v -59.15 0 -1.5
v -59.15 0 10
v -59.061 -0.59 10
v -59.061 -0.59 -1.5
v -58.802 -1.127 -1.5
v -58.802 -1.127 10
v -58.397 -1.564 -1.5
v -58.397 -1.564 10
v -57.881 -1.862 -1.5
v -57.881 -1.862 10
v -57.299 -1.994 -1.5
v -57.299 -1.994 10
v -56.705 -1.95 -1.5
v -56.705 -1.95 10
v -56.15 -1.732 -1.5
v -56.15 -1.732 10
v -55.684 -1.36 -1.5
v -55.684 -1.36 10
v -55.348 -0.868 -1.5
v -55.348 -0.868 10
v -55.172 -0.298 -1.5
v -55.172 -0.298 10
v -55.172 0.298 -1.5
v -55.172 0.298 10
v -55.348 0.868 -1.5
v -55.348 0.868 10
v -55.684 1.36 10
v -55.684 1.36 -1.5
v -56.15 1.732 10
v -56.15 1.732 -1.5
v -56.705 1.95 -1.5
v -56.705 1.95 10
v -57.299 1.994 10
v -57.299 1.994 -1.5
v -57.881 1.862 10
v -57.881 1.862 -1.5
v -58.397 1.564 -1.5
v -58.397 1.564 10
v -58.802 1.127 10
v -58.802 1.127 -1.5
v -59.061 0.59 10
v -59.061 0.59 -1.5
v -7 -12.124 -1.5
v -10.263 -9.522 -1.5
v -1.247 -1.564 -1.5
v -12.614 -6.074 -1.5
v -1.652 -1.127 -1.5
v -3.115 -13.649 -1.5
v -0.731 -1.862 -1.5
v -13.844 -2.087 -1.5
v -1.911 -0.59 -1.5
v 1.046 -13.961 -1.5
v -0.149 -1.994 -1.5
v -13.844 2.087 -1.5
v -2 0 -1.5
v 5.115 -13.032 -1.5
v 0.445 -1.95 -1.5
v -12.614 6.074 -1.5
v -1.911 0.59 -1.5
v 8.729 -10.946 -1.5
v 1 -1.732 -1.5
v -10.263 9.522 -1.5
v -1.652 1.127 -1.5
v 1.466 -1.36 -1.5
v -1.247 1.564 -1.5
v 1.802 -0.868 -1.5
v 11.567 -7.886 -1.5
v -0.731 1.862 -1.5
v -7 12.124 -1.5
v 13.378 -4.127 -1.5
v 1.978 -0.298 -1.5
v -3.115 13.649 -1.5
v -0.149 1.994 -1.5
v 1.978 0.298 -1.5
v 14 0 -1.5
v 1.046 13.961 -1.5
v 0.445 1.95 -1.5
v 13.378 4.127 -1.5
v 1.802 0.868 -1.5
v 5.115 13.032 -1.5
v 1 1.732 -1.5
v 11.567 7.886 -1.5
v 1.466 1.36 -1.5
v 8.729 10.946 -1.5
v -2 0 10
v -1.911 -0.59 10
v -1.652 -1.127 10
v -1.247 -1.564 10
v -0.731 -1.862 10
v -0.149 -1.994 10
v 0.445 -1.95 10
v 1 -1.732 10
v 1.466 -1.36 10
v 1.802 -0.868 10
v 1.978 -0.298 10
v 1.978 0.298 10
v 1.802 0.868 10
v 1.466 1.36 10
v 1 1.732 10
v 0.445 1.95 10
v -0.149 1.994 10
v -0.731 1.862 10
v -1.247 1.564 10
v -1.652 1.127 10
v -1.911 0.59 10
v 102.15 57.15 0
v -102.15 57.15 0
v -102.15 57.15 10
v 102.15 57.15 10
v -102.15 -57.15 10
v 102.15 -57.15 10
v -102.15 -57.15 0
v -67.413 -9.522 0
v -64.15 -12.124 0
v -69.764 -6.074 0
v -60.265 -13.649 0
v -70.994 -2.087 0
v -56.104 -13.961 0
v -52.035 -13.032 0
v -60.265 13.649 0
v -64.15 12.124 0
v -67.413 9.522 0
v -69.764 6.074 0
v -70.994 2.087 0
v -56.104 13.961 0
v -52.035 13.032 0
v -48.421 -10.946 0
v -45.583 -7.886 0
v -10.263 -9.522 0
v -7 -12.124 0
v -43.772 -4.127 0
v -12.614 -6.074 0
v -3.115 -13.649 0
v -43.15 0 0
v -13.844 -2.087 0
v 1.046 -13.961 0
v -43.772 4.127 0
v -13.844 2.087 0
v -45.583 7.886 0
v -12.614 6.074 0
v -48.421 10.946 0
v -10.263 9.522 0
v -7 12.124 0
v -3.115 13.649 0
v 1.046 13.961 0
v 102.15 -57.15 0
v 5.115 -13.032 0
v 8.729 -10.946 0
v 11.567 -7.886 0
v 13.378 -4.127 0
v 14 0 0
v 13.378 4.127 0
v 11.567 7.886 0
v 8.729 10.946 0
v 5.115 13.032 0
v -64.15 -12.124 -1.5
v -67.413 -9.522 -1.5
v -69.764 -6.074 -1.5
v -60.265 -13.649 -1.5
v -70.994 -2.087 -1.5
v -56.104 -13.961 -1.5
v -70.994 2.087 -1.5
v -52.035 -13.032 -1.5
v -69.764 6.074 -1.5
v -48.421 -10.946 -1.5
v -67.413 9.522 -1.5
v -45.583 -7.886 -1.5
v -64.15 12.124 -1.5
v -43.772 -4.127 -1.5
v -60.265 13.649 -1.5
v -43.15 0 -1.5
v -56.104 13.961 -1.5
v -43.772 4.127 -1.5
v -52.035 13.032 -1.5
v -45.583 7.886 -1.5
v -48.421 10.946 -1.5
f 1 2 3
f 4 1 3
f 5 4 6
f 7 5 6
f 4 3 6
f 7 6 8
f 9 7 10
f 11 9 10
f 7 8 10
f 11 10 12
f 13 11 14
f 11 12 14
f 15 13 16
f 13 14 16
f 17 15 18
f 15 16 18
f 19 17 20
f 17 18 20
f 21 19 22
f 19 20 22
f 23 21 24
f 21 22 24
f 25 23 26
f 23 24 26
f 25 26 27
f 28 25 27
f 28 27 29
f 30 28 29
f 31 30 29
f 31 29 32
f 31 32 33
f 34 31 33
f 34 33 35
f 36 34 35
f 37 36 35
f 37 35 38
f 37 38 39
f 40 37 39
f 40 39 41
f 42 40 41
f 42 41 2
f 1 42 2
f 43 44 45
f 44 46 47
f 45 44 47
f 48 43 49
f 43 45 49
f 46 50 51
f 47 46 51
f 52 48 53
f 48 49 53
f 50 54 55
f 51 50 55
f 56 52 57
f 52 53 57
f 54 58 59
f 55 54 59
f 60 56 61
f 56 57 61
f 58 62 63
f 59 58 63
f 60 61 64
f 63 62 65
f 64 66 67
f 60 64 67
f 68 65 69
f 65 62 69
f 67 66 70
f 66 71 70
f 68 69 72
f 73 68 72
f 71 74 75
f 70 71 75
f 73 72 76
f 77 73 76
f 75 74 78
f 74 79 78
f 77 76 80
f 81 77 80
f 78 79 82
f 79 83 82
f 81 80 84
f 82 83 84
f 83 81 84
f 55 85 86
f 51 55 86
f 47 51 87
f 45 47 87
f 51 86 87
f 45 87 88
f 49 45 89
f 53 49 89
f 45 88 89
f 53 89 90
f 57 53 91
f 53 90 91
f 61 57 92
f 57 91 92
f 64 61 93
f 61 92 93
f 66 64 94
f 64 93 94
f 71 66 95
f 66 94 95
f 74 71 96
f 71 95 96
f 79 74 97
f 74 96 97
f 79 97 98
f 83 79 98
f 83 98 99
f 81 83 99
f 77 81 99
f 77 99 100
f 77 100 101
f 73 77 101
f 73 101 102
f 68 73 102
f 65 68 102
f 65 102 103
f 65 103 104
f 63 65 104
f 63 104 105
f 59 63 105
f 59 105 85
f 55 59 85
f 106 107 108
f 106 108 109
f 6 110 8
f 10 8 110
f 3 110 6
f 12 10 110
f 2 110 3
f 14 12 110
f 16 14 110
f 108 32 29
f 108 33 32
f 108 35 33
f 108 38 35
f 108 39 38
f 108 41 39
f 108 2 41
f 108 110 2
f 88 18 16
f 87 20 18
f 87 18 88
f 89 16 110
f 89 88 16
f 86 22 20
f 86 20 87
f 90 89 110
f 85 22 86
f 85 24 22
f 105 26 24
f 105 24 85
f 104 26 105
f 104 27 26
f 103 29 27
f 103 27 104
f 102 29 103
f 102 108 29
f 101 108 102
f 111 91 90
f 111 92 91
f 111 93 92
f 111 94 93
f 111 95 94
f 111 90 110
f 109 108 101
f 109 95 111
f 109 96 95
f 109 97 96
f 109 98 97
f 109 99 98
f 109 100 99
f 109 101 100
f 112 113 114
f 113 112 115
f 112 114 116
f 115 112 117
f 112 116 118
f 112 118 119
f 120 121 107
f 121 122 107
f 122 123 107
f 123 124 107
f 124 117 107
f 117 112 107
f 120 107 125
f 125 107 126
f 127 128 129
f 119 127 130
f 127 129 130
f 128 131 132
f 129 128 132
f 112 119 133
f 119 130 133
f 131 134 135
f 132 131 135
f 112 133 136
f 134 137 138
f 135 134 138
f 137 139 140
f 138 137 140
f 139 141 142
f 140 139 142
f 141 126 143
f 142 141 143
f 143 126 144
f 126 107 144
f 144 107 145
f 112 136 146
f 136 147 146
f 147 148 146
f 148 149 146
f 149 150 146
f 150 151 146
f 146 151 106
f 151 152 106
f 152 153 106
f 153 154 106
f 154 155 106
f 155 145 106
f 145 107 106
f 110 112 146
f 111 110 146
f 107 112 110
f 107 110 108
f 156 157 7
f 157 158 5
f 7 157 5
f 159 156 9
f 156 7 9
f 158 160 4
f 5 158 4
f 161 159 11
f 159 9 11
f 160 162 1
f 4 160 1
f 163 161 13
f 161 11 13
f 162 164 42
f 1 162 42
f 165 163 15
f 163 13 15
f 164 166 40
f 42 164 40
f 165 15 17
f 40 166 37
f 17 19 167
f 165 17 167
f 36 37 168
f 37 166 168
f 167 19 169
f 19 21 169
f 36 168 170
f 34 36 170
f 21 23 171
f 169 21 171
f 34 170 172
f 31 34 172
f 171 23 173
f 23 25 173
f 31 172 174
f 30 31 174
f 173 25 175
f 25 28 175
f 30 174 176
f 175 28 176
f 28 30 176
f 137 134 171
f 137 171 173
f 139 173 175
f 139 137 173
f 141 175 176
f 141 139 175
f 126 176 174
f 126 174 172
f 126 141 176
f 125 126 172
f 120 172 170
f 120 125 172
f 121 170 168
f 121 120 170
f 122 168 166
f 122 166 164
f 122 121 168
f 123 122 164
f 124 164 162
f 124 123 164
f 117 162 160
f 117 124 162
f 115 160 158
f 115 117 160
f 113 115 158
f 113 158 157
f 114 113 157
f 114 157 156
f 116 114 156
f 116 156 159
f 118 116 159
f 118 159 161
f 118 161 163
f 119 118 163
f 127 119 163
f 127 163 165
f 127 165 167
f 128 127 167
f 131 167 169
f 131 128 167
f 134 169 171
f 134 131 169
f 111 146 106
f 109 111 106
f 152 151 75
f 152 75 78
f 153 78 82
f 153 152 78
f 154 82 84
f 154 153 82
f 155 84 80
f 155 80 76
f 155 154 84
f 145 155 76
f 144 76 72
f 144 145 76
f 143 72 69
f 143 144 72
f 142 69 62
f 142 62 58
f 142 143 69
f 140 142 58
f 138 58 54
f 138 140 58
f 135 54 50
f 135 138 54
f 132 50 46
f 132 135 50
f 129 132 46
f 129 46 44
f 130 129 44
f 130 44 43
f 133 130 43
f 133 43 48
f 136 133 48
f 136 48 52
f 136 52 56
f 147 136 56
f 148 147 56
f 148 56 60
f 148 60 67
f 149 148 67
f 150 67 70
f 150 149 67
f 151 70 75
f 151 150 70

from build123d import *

# Parameters (mm, degrees)
F0_W     = 204.3
F0_H     = 114.3
F0_R     = 14
F1_DEPTH = 10
F2_DEPTH = 1.5
F4_D     = 4


with BuildPart() as f1:
    # F0 (on Top) → F1 (new body)
    with BuildSketch(Plane.XY):
        Rectangle(F0_W, F0_H)
        with Locations((-57.15, 0)):
            Circle(F0_R, mode=Mode.SUBTRACT)
        Circle(F0_R, mode=Mode.SUBTRACT)
        with Locations((-57.15, 0)):
            Circle(F0_R)
        Circle(F0_R)
    extrude(amount=F1_DEPTH)

    # F0 (on Top) → F2 (join)
    with BuildSketch(Plane.XY):
        with Locations((-57.15, 0)):
            Circle(F0_R)
        Circle(F0_R)
    extrude(amount=-F2_DEPTH)

    # F4 (through all)
    with Locations(Plane(origin=(0, 0, -1.5), x_dir=(1, 0, 0), z_dir=(0, 0, -1))):
        with Locations((-57.15, 0), (0, 0)):
            Hole(F4_D / 2)


solid = f1.part
